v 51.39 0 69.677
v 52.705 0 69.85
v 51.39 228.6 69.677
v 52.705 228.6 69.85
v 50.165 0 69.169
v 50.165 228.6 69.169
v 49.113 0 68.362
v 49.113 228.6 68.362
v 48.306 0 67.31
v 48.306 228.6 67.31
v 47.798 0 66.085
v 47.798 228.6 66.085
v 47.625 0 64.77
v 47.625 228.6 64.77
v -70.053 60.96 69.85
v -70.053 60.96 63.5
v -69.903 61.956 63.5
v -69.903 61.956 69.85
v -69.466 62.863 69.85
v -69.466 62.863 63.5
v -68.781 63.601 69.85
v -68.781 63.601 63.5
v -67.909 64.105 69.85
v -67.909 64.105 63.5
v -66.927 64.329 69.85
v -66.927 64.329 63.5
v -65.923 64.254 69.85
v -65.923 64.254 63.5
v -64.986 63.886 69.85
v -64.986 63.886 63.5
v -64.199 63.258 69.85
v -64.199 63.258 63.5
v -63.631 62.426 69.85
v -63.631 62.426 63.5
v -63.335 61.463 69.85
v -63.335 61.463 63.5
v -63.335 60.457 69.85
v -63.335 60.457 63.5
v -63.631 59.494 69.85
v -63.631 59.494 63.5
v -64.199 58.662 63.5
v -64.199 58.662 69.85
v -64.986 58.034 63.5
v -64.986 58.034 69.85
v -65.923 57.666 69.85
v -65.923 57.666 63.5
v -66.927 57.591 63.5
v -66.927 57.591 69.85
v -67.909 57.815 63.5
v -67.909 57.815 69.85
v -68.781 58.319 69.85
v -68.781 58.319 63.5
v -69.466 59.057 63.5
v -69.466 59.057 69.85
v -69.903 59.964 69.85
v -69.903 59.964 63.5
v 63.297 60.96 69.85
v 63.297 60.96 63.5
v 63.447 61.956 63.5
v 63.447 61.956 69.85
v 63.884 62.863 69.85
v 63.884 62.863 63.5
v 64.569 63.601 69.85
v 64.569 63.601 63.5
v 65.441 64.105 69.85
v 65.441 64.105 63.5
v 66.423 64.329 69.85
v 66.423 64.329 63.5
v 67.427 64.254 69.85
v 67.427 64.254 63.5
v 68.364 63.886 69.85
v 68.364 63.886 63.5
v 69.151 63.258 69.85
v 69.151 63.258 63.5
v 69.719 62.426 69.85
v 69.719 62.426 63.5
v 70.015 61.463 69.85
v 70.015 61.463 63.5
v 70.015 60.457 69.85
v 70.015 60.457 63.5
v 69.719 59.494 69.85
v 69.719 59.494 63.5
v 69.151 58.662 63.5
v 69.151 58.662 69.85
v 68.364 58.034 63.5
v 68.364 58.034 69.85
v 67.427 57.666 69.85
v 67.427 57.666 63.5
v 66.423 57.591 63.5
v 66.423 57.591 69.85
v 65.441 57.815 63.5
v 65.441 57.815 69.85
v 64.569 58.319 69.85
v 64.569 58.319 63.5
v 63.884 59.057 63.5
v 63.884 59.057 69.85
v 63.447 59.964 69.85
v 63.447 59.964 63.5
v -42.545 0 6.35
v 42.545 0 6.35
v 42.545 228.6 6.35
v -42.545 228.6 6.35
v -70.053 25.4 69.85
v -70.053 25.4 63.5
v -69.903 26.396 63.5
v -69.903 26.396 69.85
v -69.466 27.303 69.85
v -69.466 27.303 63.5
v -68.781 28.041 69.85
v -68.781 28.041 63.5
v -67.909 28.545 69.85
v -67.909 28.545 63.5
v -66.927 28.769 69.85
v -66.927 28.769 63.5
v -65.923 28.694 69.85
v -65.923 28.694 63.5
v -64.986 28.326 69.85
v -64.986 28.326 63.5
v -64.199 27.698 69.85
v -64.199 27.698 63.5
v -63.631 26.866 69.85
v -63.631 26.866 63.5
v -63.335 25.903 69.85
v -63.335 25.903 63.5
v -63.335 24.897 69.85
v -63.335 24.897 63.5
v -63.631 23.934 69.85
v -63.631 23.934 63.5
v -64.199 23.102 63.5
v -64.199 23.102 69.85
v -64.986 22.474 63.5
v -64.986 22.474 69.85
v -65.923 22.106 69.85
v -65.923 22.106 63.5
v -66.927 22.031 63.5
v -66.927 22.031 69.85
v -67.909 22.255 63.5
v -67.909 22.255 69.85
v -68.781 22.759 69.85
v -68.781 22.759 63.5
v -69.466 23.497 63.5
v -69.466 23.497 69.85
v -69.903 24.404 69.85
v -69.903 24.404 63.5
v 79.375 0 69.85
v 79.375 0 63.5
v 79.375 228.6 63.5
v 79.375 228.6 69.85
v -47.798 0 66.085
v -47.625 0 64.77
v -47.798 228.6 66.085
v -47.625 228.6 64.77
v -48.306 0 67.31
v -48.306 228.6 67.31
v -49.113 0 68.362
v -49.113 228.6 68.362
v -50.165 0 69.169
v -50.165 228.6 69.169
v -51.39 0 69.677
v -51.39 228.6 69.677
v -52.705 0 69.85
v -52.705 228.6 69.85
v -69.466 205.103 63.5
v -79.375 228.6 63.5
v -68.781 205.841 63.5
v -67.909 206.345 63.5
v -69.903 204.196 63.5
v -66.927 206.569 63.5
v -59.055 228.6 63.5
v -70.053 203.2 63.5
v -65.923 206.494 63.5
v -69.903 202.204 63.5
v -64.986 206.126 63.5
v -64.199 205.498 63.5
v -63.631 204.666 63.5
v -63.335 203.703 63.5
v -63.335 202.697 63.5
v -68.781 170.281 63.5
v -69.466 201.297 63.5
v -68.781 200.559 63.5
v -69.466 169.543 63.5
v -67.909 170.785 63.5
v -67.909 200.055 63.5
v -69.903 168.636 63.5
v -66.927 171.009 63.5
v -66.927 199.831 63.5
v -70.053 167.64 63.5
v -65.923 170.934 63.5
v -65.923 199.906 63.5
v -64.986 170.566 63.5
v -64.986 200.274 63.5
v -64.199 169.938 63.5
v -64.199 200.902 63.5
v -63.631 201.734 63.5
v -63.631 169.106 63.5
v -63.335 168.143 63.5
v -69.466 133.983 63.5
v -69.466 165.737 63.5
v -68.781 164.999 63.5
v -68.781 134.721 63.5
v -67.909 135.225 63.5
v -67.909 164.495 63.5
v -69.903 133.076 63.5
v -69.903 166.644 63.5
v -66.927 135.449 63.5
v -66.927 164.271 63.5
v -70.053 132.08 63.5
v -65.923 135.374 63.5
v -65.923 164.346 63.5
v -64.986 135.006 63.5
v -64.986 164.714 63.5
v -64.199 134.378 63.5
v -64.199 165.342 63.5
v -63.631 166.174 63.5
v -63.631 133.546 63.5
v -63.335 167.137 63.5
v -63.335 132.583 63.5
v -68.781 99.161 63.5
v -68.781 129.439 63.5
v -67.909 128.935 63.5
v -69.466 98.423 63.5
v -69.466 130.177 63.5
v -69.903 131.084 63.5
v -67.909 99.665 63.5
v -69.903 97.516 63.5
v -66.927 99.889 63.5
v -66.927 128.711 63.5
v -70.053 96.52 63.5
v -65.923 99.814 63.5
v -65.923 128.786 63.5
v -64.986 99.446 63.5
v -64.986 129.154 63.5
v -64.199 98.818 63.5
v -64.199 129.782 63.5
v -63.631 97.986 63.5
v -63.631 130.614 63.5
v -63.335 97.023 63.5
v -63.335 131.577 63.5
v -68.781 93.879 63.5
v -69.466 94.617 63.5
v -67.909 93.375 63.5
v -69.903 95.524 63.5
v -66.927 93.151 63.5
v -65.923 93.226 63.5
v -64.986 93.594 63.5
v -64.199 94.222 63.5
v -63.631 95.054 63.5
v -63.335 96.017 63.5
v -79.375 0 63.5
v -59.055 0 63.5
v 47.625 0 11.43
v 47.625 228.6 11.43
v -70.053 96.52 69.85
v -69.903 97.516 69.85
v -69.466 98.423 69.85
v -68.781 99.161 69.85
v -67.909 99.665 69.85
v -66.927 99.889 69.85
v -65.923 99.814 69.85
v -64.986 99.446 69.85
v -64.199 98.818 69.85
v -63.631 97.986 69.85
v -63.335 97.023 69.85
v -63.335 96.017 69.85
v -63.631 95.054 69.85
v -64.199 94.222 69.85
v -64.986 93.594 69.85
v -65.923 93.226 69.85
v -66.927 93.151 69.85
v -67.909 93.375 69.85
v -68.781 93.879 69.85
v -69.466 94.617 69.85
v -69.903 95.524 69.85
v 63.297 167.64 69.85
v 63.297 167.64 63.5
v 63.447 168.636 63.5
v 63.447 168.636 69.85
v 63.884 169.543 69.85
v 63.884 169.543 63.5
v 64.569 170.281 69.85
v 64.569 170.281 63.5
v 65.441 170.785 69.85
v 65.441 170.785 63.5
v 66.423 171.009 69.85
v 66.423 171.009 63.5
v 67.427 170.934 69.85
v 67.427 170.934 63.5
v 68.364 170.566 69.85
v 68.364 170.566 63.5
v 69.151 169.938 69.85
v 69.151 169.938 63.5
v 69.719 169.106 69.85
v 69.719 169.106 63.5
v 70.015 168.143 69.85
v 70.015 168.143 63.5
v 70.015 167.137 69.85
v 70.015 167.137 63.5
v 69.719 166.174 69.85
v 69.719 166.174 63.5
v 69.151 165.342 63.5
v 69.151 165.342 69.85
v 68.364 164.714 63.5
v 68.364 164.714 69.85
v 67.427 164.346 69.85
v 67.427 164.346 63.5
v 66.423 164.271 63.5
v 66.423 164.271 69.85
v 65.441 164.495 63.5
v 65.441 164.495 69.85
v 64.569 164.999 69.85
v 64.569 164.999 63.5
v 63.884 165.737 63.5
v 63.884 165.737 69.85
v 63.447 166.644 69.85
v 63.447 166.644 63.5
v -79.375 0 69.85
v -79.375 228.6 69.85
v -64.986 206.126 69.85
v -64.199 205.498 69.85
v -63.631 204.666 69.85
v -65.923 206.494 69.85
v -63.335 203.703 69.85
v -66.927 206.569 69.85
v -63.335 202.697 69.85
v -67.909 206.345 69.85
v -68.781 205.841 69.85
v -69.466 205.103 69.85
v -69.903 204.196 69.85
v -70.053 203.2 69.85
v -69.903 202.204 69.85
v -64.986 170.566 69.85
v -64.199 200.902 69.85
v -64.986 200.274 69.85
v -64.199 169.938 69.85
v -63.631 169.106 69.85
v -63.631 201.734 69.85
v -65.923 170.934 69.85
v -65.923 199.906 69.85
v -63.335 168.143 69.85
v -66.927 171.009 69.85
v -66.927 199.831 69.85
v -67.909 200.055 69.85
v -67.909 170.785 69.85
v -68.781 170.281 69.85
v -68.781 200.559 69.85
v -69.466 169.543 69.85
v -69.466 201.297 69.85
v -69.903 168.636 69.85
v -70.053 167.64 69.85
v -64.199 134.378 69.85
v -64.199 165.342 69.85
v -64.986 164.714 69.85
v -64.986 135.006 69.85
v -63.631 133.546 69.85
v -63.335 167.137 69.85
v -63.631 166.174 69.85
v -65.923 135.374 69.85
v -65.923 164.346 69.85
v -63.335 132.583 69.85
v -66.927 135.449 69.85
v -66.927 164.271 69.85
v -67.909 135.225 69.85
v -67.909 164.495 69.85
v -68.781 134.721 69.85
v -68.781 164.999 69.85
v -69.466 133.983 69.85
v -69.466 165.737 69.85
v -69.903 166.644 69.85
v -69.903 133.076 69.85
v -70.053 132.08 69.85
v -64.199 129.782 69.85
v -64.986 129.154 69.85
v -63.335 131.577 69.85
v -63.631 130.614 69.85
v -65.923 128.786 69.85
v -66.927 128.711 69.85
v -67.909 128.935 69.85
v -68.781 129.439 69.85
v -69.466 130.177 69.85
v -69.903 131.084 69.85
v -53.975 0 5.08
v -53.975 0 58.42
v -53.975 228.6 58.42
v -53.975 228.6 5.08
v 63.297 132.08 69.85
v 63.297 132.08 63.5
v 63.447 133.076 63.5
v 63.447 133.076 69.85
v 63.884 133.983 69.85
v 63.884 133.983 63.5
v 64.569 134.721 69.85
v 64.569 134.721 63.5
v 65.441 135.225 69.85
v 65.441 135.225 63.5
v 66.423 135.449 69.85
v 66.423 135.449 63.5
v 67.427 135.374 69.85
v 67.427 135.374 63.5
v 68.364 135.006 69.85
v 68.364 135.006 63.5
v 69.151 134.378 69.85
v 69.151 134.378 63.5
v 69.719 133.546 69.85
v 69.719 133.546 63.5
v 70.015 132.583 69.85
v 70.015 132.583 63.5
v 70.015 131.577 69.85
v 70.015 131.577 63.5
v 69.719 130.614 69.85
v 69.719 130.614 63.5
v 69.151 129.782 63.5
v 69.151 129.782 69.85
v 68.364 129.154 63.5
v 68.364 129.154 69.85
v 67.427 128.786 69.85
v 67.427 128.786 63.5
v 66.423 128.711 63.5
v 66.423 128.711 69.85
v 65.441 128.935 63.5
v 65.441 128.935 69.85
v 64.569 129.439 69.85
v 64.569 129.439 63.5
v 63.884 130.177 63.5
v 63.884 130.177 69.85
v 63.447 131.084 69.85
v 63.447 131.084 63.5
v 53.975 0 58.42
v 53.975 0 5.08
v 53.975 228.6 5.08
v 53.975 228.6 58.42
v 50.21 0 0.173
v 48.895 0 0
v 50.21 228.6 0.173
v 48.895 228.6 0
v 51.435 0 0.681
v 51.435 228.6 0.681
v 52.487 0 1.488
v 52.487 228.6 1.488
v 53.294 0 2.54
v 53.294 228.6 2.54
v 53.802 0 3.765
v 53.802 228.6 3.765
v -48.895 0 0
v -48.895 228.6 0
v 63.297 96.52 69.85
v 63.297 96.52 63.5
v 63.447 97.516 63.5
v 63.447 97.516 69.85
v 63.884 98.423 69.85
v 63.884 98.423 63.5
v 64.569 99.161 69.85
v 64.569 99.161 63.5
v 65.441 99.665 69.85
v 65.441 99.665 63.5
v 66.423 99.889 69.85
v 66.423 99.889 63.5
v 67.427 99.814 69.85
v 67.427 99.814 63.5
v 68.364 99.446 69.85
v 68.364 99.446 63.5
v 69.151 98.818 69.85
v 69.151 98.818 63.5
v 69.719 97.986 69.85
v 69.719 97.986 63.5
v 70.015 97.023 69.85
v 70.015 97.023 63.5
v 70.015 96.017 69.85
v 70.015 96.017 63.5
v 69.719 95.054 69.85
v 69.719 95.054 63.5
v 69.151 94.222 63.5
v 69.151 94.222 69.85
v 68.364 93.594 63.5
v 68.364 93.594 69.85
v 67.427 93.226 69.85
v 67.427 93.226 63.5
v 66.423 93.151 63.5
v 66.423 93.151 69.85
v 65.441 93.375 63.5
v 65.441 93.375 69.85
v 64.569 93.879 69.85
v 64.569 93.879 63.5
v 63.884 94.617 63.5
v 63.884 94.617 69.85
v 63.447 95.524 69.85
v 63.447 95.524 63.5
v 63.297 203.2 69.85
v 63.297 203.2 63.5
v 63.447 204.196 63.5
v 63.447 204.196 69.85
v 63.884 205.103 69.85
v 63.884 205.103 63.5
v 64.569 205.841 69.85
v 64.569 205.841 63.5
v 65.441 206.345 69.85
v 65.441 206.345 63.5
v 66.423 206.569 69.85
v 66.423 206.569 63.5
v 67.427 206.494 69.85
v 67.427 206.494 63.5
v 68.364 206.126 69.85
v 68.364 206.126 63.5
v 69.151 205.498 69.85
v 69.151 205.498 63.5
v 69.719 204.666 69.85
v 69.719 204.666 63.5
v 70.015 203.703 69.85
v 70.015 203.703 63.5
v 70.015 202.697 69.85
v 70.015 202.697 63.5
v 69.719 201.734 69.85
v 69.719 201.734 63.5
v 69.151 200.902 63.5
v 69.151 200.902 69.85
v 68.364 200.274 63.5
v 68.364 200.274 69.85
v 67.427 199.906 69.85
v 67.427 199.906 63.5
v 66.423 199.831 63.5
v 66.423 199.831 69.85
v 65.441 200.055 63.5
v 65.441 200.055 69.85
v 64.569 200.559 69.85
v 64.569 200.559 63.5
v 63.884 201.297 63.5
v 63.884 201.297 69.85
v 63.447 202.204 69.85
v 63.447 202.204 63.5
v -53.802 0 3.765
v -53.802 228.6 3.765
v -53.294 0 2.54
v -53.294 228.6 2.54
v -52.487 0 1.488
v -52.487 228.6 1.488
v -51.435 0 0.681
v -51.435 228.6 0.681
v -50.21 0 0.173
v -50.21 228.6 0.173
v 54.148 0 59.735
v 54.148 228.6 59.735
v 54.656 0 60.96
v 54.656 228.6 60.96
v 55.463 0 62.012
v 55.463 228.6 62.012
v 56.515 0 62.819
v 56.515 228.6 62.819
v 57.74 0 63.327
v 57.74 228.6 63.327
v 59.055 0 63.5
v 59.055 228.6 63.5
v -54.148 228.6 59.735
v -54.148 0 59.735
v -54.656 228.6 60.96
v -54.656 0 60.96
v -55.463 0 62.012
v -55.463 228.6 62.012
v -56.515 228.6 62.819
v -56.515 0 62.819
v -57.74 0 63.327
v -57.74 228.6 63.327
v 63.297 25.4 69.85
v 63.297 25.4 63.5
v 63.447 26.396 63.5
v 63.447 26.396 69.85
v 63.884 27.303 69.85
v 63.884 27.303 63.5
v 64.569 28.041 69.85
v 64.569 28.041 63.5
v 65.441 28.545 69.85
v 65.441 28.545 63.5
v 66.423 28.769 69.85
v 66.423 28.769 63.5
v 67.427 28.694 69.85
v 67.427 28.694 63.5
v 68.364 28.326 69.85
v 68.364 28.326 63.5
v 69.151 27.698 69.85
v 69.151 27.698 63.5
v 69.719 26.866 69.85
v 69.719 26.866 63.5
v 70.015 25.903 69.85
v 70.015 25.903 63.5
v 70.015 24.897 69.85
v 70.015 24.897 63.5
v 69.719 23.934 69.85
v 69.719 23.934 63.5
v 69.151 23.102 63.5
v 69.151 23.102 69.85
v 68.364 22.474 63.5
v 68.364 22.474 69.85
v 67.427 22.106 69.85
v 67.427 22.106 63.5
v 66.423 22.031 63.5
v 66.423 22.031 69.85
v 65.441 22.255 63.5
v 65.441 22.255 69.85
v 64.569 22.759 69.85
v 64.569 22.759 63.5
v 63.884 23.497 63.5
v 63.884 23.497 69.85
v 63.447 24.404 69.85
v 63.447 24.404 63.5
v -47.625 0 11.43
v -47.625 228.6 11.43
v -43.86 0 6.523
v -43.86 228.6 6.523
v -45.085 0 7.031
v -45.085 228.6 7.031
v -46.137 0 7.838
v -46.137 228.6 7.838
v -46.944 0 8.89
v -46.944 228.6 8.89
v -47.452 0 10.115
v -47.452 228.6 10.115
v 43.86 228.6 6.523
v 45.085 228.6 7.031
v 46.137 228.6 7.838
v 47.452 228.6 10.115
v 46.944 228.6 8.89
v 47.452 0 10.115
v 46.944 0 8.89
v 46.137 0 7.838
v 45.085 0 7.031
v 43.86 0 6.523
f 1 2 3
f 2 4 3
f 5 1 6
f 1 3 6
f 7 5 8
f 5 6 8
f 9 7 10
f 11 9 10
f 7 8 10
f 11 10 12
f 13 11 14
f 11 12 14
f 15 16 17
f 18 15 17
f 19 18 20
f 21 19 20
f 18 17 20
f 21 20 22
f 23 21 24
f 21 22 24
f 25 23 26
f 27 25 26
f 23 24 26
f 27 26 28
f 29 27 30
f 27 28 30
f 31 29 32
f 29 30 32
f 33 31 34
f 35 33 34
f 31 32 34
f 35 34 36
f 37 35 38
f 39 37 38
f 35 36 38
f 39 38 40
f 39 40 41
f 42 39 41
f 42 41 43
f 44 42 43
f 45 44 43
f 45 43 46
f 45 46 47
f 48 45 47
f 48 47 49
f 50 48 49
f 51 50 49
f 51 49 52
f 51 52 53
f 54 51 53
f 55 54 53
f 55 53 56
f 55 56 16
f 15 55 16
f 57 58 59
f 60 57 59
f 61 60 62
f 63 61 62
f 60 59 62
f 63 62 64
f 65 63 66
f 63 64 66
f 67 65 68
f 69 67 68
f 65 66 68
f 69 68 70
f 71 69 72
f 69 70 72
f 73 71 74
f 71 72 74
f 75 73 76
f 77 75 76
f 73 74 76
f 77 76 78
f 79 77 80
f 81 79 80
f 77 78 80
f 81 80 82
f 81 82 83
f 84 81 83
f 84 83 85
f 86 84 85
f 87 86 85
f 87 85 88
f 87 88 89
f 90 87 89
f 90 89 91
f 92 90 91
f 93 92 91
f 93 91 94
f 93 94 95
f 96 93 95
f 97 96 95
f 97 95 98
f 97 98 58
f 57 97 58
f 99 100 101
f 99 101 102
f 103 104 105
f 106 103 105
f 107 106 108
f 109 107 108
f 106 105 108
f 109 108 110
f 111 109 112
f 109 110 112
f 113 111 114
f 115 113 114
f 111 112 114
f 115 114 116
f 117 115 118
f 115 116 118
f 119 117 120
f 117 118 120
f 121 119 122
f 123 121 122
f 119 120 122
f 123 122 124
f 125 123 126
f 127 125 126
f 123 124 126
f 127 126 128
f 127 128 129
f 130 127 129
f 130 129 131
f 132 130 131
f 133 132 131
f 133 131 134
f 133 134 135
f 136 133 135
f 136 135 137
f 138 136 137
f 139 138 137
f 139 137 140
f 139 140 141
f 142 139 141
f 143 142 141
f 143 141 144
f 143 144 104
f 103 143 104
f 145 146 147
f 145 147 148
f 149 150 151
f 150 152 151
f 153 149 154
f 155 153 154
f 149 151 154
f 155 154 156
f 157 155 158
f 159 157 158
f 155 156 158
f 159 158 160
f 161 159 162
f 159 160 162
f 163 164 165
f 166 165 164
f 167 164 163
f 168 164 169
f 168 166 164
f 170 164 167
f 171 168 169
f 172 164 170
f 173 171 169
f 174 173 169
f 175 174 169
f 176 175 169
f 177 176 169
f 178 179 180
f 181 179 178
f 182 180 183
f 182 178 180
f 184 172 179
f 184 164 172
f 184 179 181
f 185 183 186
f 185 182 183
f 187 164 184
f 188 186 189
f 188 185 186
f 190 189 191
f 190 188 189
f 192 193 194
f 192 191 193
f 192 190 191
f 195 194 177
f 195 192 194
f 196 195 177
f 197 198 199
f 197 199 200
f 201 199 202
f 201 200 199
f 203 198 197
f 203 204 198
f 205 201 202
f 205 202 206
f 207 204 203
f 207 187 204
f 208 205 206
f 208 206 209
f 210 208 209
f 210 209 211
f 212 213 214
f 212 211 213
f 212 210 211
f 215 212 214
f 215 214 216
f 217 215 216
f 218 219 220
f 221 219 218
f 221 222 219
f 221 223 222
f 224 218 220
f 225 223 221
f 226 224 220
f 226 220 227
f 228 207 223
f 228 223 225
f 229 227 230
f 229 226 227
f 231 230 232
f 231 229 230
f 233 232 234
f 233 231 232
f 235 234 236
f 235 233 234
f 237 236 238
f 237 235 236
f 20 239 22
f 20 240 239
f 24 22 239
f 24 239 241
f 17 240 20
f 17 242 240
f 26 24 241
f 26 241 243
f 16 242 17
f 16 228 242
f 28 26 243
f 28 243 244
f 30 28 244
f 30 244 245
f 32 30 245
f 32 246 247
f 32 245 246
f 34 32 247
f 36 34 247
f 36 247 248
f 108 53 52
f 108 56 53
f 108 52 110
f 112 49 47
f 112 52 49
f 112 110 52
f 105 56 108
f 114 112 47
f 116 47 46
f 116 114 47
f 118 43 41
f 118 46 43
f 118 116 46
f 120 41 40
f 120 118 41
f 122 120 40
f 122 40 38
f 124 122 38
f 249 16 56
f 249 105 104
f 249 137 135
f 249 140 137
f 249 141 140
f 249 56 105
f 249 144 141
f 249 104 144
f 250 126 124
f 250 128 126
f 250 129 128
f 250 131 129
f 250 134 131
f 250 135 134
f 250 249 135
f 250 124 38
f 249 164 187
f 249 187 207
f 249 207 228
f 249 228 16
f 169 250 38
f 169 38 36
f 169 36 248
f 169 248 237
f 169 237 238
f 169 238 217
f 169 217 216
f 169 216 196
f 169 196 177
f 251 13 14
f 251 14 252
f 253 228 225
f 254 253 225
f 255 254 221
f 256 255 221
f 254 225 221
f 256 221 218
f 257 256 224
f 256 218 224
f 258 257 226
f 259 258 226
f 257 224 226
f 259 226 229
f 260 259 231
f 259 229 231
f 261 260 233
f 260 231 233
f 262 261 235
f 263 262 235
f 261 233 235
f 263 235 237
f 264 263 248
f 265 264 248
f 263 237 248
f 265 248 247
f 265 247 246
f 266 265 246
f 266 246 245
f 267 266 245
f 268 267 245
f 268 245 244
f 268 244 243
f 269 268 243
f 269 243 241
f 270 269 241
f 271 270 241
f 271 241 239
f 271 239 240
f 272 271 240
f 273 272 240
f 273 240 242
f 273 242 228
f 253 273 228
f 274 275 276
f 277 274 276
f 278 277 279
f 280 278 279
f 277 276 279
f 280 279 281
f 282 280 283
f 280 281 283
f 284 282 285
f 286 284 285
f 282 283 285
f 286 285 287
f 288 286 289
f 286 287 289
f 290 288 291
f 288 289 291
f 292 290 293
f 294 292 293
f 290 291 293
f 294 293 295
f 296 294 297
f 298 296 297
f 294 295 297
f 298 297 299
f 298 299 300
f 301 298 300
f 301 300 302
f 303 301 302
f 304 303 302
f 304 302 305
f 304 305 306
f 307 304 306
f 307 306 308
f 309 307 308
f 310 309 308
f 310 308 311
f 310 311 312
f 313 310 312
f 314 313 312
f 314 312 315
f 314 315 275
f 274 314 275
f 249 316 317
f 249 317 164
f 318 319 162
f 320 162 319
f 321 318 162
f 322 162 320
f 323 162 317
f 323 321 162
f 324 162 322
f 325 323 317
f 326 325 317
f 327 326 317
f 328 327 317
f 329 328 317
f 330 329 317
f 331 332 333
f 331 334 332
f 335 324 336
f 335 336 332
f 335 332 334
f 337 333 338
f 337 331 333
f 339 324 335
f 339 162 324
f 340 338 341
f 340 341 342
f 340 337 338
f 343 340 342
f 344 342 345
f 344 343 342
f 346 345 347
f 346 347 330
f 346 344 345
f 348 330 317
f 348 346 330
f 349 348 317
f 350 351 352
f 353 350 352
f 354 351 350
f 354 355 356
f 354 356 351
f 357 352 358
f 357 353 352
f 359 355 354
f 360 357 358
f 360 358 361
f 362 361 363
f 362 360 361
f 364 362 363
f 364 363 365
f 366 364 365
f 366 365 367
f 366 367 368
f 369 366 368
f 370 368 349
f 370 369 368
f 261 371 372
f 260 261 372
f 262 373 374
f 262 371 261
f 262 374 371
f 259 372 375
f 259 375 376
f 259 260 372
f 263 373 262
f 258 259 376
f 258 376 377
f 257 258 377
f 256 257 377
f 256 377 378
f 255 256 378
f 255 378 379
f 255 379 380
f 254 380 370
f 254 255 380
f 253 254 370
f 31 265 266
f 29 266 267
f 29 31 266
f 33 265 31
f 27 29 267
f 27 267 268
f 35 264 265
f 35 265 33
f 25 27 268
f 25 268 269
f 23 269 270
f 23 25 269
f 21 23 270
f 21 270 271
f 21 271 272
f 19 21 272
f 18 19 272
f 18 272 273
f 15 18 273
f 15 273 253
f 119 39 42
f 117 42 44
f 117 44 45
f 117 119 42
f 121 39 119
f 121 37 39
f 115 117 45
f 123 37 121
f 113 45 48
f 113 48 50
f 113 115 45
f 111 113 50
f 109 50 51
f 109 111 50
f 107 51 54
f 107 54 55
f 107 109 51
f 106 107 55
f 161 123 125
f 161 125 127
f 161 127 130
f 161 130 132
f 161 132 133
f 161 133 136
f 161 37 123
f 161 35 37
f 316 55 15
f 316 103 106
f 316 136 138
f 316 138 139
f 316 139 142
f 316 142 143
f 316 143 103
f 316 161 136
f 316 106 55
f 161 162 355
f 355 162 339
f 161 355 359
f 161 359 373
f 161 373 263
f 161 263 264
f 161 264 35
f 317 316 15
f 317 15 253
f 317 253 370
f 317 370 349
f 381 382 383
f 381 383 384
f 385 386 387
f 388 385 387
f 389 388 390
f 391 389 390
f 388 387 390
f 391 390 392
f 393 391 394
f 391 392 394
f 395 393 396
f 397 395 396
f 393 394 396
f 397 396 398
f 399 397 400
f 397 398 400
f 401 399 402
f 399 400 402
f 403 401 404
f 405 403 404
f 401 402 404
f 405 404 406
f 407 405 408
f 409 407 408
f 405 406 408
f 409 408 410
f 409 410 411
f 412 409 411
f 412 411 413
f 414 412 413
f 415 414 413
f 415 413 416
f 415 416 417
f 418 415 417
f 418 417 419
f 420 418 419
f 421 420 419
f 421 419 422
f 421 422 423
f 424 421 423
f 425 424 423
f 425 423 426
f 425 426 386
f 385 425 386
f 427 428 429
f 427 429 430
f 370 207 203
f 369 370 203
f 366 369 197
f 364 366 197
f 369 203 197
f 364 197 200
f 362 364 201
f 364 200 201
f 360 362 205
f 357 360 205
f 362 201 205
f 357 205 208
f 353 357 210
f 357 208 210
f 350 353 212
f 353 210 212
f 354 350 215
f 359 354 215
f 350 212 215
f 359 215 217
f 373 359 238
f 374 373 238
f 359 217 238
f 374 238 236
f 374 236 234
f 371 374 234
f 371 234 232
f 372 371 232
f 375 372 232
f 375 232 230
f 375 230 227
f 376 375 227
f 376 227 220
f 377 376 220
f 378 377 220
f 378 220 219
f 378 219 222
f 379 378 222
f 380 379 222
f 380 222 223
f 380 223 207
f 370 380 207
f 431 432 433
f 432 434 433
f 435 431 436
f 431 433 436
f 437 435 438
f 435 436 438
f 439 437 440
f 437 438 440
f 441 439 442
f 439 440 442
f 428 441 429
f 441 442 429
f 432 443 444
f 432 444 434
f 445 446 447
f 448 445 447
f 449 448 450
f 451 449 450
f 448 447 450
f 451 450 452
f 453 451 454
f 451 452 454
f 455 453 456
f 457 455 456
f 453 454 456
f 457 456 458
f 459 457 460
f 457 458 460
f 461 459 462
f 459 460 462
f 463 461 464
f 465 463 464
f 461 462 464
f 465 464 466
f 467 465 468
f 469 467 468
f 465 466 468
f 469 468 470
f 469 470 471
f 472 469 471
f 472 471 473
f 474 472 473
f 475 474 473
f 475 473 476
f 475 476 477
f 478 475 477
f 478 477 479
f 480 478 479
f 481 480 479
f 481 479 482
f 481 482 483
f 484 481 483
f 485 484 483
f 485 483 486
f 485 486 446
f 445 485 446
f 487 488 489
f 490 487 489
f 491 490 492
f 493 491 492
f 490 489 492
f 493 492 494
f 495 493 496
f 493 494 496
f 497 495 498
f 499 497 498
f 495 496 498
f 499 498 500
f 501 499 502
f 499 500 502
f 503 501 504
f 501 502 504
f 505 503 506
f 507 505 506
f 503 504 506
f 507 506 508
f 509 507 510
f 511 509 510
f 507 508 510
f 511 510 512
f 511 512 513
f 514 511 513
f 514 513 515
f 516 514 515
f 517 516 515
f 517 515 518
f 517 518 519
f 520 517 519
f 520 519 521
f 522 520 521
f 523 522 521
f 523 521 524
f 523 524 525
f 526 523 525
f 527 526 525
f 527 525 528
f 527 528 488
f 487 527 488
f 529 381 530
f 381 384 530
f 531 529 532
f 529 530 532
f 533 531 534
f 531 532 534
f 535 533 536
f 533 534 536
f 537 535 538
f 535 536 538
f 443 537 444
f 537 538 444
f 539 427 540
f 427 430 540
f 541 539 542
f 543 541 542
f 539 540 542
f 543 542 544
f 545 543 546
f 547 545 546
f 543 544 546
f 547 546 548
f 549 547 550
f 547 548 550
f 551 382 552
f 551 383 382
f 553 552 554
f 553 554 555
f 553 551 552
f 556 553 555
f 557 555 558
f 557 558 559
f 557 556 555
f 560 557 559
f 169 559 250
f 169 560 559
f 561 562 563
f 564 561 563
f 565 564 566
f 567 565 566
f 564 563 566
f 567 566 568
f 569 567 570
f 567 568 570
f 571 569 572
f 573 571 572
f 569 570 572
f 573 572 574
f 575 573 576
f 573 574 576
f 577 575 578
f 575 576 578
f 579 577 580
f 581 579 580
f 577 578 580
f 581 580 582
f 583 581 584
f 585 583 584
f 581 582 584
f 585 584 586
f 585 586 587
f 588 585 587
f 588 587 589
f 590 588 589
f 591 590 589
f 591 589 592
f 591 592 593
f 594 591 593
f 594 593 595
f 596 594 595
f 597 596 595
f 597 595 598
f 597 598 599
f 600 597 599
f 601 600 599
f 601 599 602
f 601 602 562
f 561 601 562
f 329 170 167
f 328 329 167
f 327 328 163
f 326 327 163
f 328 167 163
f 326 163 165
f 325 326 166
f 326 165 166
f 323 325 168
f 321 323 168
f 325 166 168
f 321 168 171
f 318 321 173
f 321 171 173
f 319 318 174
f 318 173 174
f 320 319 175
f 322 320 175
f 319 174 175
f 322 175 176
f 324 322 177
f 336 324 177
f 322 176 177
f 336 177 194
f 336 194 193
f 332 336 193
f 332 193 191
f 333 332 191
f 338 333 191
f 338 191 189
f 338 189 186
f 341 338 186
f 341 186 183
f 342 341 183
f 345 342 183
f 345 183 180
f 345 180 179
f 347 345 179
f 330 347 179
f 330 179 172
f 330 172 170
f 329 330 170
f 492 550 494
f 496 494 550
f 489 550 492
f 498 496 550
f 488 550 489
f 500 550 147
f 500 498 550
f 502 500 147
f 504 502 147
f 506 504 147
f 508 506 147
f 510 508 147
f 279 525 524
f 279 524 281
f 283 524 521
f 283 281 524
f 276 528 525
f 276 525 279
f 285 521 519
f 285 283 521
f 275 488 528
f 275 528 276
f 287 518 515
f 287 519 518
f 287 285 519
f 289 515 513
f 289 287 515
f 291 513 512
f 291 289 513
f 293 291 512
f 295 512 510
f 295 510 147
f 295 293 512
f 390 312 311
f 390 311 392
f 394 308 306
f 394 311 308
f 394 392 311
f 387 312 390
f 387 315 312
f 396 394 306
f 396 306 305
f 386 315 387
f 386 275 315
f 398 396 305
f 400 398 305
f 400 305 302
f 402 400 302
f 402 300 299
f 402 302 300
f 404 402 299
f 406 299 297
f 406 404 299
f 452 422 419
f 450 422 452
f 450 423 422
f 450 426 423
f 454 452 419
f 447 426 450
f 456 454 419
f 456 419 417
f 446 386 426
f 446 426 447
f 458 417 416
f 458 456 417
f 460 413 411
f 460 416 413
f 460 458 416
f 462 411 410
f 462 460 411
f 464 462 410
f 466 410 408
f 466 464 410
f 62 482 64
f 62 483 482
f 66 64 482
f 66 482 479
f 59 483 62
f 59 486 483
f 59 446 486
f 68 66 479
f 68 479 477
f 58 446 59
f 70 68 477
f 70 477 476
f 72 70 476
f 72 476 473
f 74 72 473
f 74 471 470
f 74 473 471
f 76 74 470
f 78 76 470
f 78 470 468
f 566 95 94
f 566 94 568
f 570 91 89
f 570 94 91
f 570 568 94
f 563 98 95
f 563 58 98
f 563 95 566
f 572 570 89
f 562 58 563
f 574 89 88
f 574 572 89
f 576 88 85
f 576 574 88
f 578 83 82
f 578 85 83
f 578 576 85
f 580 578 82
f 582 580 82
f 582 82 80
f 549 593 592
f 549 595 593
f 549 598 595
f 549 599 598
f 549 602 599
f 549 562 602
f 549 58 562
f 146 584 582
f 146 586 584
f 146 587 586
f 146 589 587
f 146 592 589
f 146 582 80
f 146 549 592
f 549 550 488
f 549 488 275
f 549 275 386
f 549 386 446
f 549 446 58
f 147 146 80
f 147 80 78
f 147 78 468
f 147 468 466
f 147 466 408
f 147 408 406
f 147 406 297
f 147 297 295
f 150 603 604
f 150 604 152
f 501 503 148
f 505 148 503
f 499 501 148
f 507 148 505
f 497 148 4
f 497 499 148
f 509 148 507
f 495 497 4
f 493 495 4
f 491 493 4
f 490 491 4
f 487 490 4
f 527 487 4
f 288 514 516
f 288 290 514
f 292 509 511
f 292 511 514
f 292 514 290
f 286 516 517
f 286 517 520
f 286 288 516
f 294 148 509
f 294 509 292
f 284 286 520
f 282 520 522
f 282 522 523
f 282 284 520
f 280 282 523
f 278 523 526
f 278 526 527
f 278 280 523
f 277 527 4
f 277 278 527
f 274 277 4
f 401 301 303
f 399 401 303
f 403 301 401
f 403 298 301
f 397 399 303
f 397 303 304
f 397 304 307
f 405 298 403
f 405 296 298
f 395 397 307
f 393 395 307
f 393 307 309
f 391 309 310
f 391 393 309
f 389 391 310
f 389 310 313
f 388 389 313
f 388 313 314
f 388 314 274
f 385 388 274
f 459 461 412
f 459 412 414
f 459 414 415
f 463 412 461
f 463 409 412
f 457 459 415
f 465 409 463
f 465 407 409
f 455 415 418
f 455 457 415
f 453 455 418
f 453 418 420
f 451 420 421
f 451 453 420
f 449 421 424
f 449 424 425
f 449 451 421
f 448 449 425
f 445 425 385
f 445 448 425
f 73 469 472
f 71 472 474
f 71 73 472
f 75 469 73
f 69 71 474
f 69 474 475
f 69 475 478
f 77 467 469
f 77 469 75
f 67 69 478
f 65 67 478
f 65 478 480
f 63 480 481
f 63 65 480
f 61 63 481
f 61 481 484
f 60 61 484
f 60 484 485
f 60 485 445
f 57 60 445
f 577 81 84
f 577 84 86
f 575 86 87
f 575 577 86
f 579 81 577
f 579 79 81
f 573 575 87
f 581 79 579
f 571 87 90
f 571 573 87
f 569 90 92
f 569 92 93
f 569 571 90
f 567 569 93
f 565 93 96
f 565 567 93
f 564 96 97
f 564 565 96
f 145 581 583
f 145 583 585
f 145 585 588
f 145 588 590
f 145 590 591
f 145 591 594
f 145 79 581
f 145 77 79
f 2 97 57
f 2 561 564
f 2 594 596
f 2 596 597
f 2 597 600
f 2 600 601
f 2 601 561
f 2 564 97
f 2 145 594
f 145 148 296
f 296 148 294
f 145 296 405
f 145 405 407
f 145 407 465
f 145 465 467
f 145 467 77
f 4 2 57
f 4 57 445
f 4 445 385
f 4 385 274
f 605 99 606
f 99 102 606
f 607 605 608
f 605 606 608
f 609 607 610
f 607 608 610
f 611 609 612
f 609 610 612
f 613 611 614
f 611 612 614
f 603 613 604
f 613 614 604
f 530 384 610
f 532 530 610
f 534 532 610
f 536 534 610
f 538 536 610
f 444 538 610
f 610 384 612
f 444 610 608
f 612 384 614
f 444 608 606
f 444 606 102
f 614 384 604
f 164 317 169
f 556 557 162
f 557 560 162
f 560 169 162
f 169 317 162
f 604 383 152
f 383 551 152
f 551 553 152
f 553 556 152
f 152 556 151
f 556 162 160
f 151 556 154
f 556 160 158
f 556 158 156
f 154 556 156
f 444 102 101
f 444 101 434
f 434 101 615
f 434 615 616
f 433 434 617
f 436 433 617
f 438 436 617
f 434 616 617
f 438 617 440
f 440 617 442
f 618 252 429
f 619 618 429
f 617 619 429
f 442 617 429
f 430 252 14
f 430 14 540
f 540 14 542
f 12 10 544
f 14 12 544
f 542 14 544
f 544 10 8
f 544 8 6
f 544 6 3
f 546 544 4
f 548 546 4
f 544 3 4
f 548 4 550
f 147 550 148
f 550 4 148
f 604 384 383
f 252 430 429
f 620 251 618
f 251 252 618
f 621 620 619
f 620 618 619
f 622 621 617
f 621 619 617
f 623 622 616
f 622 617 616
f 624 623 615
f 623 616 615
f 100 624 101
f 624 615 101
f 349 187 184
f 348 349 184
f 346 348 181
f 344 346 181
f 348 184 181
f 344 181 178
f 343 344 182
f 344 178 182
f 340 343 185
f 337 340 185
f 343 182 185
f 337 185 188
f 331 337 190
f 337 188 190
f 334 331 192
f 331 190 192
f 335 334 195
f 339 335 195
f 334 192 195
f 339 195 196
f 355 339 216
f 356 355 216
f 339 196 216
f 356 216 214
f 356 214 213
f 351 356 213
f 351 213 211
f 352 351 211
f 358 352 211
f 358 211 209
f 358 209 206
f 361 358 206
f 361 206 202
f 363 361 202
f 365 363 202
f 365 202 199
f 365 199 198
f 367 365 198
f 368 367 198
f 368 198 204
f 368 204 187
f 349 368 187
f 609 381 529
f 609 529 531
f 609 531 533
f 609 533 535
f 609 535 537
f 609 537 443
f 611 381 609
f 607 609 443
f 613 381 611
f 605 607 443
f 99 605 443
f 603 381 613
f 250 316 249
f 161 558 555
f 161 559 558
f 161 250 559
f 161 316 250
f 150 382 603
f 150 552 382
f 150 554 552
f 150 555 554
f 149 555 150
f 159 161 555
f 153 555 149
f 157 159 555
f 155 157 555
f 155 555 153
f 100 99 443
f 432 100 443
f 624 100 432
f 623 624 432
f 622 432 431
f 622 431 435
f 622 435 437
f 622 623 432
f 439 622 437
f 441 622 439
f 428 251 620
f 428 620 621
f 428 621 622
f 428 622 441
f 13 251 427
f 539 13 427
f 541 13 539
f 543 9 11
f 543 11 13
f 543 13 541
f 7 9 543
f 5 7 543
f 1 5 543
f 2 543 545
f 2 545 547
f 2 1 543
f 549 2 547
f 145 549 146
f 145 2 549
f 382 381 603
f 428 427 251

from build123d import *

# Parameters (mm, degrees)
F1_DEPTH = 228.6
F3_R     = 5.08
F6_D     = 6.7564
F7_D     = 6.7564


with BuildPart() as f1:
    # F0 (on Front) → F1 (new body)
    with BuildSketch(Plane.XZ):
        Polygon((-53.975, 63.5), (-53.975, 0), (53.975, 0), (53.975, 63.5), (79.375, 63.5), (79.375, 69.85), (47.625, 69.85), (47.625, 6.35), (-47.625, 6.35), (-47.625, 69.85), (-79.375, 69.85), (-79.375, 63.5), align=None)
    extrude(amount=-F1_DEPTH)

    # F3
    f3_edges = [f1.edges().sort_by_distance(p)[0] for p in [
        (-47.625, 114.3, 69.85),
        (-47.625, 114.3, 6.35),
        (53.975, 114.3, 0),
        (47.625, 114.3, 6.35),
        (-53.975, 114.3, 0),
        (-53.975, 114.3, 63.5),
        (53.975, 114.3, 63.5),
        (47.625, 114.3, 69.85),
    ]]
    fillet(f3_edges, radius=F3_R)

    # F6 (through all)
    with Locations(Plane.XY.offset(69.85)):
        with Locations((-66.675, 203.2), (-66.675, 167.64), (-66.675, 132.08), (-66.675, 96.52), (-66.675, 60.96), (-66.675, 25.4)):
            Hole(F6_D / 2)

    # F7 (through all)
    with Locations(Plane.XY.offset(69.85)):
        with Locations((66.675, 203.2), (66.675, 167.64), (66.675, 132.08), (66.675, 96.52), (66.675, 60.96), (66.675, 25.4)):
            Hole(F7_D / 2)


solid = f1.part
